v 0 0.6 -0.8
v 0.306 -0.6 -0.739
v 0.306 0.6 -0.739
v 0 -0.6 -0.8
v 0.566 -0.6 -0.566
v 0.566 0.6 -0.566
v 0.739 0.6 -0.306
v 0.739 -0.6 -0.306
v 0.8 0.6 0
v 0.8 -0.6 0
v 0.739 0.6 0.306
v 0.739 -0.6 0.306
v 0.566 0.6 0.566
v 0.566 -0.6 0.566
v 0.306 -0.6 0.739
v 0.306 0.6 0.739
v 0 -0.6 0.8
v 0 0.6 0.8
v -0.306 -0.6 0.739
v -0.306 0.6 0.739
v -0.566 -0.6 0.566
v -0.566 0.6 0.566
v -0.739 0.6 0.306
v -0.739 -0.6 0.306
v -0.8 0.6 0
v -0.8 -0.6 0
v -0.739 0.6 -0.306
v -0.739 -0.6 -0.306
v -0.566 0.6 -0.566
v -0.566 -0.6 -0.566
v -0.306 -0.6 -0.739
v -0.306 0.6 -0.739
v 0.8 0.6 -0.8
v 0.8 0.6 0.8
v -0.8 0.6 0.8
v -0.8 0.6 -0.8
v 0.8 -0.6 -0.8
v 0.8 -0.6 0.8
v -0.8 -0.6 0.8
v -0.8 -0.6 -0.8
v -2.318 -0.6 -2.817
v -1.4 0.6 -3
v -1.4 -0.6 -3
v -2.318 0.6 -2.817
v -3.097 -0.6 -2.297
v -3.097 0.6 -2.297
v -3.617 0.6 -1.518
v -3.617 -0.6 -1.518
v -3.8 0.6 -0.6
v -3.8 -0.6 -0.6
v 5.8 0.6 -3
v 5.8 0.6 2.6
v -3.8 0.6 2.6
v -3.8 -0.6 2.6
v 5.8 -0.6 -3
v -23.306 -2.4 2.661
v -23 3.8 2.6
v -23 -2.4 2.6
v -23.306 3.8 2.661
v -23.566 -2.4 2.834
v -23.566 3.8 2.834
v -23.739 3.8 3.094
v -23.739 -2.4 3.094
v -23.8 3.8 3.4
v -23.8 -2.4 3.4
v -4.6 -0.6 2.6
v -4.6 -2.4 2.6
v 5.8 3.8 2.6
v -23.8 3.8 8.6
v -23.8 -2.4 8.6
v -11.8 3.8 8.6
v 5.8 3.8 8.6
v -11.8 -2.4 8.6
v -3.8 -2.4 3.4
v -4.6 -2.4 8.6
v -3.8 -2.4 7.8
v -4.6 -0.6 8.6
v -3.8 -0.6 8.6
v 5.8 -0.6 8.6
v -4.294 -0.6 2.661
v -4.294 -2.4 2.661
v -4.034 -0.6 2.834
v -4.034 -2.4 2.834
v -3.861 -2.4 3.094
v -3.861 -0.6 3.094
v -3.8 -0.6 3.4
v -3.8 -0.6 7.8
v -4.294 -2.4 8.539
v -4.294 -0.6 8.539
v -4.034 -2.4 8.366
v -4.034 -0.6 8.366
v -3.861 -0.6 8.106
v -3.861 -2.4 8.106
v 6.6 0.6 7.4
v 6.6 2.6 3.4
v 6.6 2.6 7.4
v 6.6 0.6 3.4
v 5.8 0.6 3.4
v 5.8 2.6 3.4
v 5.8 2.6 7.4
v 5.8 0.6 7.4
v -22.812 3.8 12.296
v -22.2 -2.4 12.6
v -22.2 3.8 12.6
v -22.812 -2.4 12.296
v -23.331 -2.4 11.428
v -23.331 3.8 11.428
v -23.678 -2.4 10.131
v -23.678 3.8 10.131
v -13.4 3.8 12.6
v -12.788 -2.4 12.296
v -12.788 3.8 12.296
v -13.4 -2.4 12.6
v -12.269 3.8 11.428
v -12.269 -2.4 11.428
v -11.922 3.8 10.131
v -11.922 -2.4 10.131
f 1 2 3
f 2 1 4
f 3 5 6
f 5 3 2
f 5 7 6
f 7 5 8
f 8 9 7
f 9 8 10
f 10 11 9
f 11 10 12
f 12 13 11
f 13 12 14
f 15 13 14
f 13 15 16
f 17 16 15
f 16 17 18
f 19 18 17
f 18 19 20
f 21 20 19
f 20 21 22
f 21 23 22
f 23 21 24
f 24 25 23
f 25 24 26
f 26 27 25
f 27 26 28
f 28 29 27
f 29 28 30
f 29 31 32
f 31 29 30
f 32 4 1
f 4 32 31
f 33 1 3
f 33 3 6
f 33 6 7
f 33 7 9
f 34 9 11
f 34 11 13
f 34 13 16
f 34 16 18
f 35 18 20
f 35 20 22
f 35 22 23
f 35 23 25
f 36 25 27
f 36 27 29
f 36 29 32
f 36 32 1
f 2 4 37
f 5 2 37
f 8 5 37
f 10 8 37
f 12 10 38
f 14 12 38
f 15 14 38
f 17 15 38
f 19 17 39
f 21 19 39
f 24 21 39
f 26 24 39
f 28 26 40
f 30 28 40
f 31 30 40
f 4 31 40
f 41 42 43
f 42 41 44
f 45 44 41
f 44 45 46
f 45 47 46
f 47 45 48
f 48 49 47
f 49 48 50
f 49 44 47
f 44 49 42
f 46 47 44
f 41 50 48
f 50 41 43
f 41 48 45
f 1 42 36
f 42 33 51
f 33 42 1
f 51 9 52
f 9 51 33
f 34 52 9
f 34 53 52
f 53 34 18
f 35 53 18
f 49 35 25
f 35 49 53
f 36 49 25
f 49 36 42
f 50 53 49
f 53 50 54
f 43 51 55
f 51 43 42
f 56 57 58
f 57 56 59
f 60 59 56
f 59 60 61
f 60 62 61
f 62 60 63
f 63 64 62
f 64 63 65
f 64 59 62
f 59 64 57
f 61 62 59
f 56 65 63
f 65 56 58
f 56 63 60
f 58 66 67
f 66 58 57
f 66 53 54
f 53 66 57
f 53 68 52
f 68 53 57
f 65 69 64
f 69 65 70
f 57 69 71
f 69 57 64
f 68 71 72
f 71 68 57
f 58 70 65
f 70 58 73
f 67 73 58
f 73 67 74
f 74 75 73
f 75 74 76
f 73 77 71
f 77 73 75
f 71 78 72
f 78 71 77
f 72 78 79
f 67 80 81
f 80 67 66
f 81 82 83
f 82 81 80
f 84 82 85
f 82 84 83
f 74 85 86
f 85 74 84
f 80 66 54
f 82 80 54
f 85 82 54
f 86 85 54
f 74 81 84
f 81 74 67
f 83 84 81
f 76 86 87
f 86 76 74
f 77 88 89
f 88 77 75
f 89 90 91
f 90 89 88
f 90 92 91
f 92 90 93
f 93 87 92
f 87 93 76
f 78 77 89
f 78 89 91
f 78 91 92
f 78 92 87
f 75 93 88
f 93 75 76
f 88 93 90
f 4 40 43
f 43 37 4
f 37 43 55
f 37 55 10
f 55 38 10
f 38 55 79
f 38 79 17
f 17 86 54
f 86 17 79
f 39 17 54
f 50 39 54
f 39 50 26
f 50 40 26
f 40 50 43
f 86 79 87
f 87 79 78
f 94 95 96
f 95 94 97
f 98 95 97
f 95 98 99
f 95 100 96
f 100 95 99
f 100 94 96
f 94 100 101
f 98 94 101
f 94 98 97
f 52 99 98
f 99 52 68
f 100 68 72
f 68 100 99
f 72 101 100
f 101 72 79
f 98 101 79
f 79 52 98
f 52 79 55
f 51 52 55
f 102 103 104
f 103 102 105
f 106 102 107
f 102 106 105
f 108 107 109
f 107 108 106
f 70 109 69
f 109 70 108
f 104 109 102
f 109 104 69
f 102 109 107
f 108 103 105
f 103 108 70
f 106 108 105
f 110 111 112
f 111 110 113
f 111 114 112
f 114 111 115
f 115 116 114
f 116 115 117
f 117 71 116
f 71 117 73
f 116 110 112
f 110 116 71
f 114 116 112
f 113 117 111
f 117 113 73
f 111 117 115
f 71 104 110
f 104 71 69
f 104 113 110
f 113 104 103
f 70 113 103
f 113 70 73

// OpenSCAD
// file: ../p/4-4edge.scad
use <../lib.scad>
function ldraw_lib__4_4edge() = [
// 0 Circle 1.0
// 0 Name: 4-4edge.dat
// 0 Author: James Jessiman
// 0 !LDRAW_ORG Primitive UPDATE 2017-01
// 0 !LICENSE Licensed under CC BY 4.0 : see CAreadme.txt
// 
// 0 BFC CERTIFY CCW
  [0,"BFC","CERTIFY"],
  [0,"BFC","CCW"],
// 
// 0 !HISTORY 1998-12-15 [PTadmin] Official Update 1998-10
// 0 !HISTORY 2005-12-28 [PTadmin] Official Update 2005-01
// 0 !HISTORY 2007-06-24 [PTadmin] Header formatted for Contributor Agreement
// 0 !HISTORY 2008-07-01 [PTadmin] Official Update 2008-01
// 0 !HISTORY 2017-01-15 [Steffen] BFCed
// 0 !HISTORY 2017-12-30 [PTadmin] Official Update 2017-01
// 
// 
// 2 24 1 0 0 0.9239 0 0.3827
  [2,24,1,0,0,0.9239,0,0.3827],
// 2 24 0.9239 0 0.3827 0.7071 0 0.7071
  [2,24,0.9239,0,0.3827,0.7071,0,0.7071],
// 2 24 0.7071 0 0.7071 0.3827 0 0.9239
  [2,24,0.7071,0,0.7071,0.3827,0,0.9239],
// 2 24 0.3827 0 0.9239 0 0 1
  [2,24,0.3827,0,0.9239,0,0,1],
// 2 24 0 0 1 -0.3827 0 0.9239
  [2,24,0,0,1,-0.3827,0,0.9239],
// 2 24 -0.3827 0 0.9239 -0.7071 0 0.7071
  [2,24,-0.3827,0,0.9239,-0.7071,0,0.7071],
// 2 24 -0.7071 0 0.7071 -0.9239 0 0.3827
  [2,24,-0.7071,0,0.7071,-0.9239,0,0.3827],
// 2 24 -0.9239 0 0.3827 -1 0 -0
  [2,24,-0.9239,0,0.3827,-1,0,-0],
// 2 24 -1 0 -0 -0.9239 0 -0.3827
  [2,24,-1,0,-0,-0.9239,0,-0.3827],
// 2 24 -0.9239 0 -0.3827 -0.7071 0 -0.7071
  [2,24,-0.9239,0,-0.3827,-0.7071,0,-0.7071],
// 2 24 -0.7071 0 -0.7071 -0.3827 0 -0.9239
  [2,24,-0.7071,0,-0.7071,-0.3827,0,-0.9239],
// 2 24 -0.3827 0 -0.9239 0 0 -1
  [2,24,-0.3827,0,-0.9239,0,0,-1],
// 2 24 0 0 -1 0.3827 0 -0.9239
  [2,24,0,0,-1,0.3827,0,-0.9239],
// 2 24 0.3827 0 -0.9239 0.7071 0 -0.7071
  [2,24,0.3827,0,-0.9239,0.7071,0,-0.7071],
// 2 24 0.7071 0 -0.7071 0.9239 0 -0.3827
  [2,24,0.7071,0,-0.7071,0.9239,0,-0.3827],
// 2 24 0.9239 0 -0.3827 1 0 0
  [2,24,0.9239,0,-0.3827,1,0,0],
];
module ldraw_lib__4_4edge(step=0, col=false, unit=2/5, alt=false, line=0.2, solid=!$preview)
    makepoly(ldraw_lib__4_4edge(), step=step, col=col, unit=unit, alt=alt, line=line, solid=solid);
ldraw_lib__4_4edge(line=0.2);
// file: ../p/4-4cyli.scad
use <../lib.scad>
function ldraw_lib__4_4cyli() = [
// 0 Cylinder 1.0
// 0 Name: 4-4cyli.dat
// 0 Author: James Jessiman
// 0 !LDRAW_ORG Primitive UPDATE 2005-01
// 0 !LICENSE Licensed under CC BY 4.0 : see CAreadme.txt
// 
// 0 BFC CERTIFY CCW
  [0,"BFC","CERTIFY"],
  [0,"BFC","CCW"],
// 
// 0 !HISTORY 1998-12-15 [PTadmin] Official Update 1998-10
// 0 !HISTORY 2002-03-23 [sbliss] Added BFC statement; merged headers from files in distributions LDraw 0.27 and Complete.
// 0 !HISTORY 2002-04-25 [PTadmin] Official Update 2002-02
// 0 !HISTORY 2004-12-14 [guyvivan] BFC CCW
// 0 !HISTORY 2005-12-28 [PTadmin] Official Update 2005-01
// 0 !HISTORY 2007-06-24 [PTadmin] Header formatted for Contributor Agreement
// 0 !HISTORY 2008-07-01 [PTadmin] Official Update 2008-01
// 
// 
// 4 16 1 1 0 0.9239 1 0.3827 0.9239 0 0.3827 1 0 0
  [4,16,1,1,0,0.9239,1,0.3827,0.9239,0,0.3827,1,0,0],
// 5 24 1 0 0 1 1 0 0.9239 0 0.3827 0.9239 0 -0.3827
  [5,24,1,0,0,1,1,0,0.9239,0,0.3827,0.9239,0,-0.3827],
// 4 16 0.9239 1 0.3827 0.7071 1 0.7071 0.7071 0 0.7071 0.9239 0 0.3827
  [4,16,0.9239,1,0.3827,0.7071,1,0.7071,0.7071,0,0.7071,0.9239,0,0.3827],
// 5 24 0.9239 0 0.3827 0.9239 1 0.3827 0.7071 0 0.7071 1 0 0
  [5,24,0.9239,0,0.3827,0.9239,1,0.3827,0.7071,0,0.7071,1,0,0],
// 4 16 0.7071 1 0.7071 0.3827 1 0.9239 0.3827 0 0.9239 0.7071 0 0.7071
  [4,16,0.7071,1,0.7071,0.3827,1,0.9239,0.3827,0,0.9239,0.7071,0,0.7071],
// 5 24 0.7071 0 0.7071 0.7071 1 0.7071 0.3827 0 0.9239 0.9239 0 0.3827
  [5,24,0.7071,0,0.7071,0.7071,1,0.7071,0.3827,0,0.9239,0.9239,0,0.3827],
// 4 16 0.3827 1 0.9239 0 1 1 0 0 1 0.3827 0 0.9239
  [4,16,0.3827,1,0.9239,0,1,1,0,0,1,0.3827,0,0.9239],
// 5 24 0.3827 0 0.9239 0.3827 1 0.9239 0 0 1 0.7071 0 0.7071
  [5,24,0.3827,0,0.9239,0.3827,1,0.9239,0,0,1,0.7071,0,0.7071],
// 4 16 0 1 1 -0.3827 1 0.9239 -0.3827 0 0.9239 0 0 1
  [4,16,0,1,1,-0.3827,1,0.9239,-0.3827,0,0.9239,0,0,1],
// 5 24 0 0 1 0 1 1 -0.3827 0 0.9239 0.3827 0 0.9239
  [5,24,0,0,1,0,1,1,-0.3827,0,0.9239,0.3827,0,0.9239],
// 4 16 -0.3827 1 0.9239 -0.7071 1 0.7071 -0.7071 0 0.7071 -0.3827 0 0.9239
  [4,16,-0.3827,1,0.9239,-0.7071,1,0.7071,-0.7071,0,0.7071,-0.3827,0,0.9239],
// 5 24 -0.3827 0 0.9239 -0.3827 1 0.9239 -0.7071 0 0.7071 0 0 1
  [5,24,-0.3827,0,0.9239,-0.3827,1,0.9239,-0.7071,0,0.7071,0,0,1],
// 4 16 -0.7071 1 0.7071 -0.9239 1 0.3827 -0.9239 0 0.3827 -0.7071 0 0.7071
  [4,16,-0.7071,1,0.7071,-0.9239,1,0.3827,-0.9239,0,0.3827,-0.7071,0,0.7071],
// 5 24 -0.7071 0 0.7071 -0.7071 1 0.7071 -0.9239 0 0.3827 -0.3827 0 0.9239
  [5,24,-0.7071,0,0.7071,-0.7071,1,0.7071,-0.9239,0,0.3827,-0.3827,0,0.9239],
// 4 16 -0.9239 1 0.3827 -1 1 0 -1 0 0 -0.9239 0 0.3827
  [4,16,-0.9239,1,0.3827,-1,1,0,-1,0,0,-0.9239,0,0.3827],
// 5 24 -0.9239 0 0.3827 -0.9239 1 0.3827 -1 0 0 -0.7071 0 0.7071
  [5,24,-0.9239,0,0.3827,-0.9239,1,0.3827,-1,0,0,-0.7071,0,0.7071],
// 4 16 -1 1 0 -0.9239 1 -0.3827 -0.9239 0 -0.3827 -1 0 0
  [4,16,-1,1,0,-0.9239,1,-0.3827,-0.9239,0,-0.3827,-1,0,0],
// 5 24 -1 0 0 -1 1 0 -0.9239 0 -0.3827 -0.9239 0 0.3827
  [5,24,-1,0,0,-1,1,0,-0.9239,0,-0.3827,-0.9239,0,0.3827],
// 4 16 -0.9239 1 -0.3827 -0.7071 1 -0.7071 -0.7071 0 -0.7071 -0.9239 0 -0.3827
  [4,16,-0.9239,1,-0.3827,-0.7071,1,-0.7071,-0.7071,0,-0.7071,-0.9239,0,-0.3827],
// 5 24 -0.9239 0 -0.3827 -0.9239 1 -0.3827 -0.7071 0 -0.7071 -1 0 0
  [5,24,-0.9239,0,-0.3827,-0.9239,1,-0.3827,-0.7071,0,-0.7071,-1,0,0],
// 4 16 -0.7071 1 -0.7071 -0.3827 1 -0.9239 -0.3827 0 -0.9239 -0.7071 0 -0.7071
  [4,16,-0.7071,1,-0.7071,-0.3827,1,-0.9239,-0.3827,0,-0.9239,-0.7071,0,-0.7071],
// 5 24 -0.7071 0 -0.7071 -0.7071 1 -0.7071 -0.3827 0 -0.9239 -0.9239 0 -0.3827
  [5,24,-0.7071,0,-0.7071,-0.7071,1,-0.7071,-0.3827,0,-0.9239,-0.9239,0,-0.3827],
// 4 16 -0.3827 1 -0.9239 0 1 -1 0 0 -1 -0.3827 0 -0.9239
  [4,16,-0.3827,1,-0.9239,0,1,-1,0,0,-1,-0.3827,0,-0.9239],
// 5 24 -0.3827 0 -0.9239 -0.3827 1 -0.9239 0 0 -1 -0.7071 0 -0.7071
  [5,24,-0.3827,0,-0.9239,-0.3827,1,-0.9239,0,0,-1,-0.7071,0,-0.7071],
// 4 16 0 1 -1 0.3827 1 -0.9239 0.3827 0 -0.9239 0 0 -1
  [4,16,0,1,-1,0.3827,1,-0.9239,0.3827,0,-0.9239,0,0,-1],
// 5 24 0 0 -1 0 1 -1 0.3827 0 -0.9239 -0.3827 0 -0.9239
  [5,24,0,0,-1,0,1,-1,0.3827,0,-0.9239,-0.3827,0,-0.9239],
// 4 16 0.3827 1 -0.9239 0.7071 1 -0.7071 0.7071 0 -0.7071 0.3827 0 -0.9239
  [4,16,0.3827,1,-0.9239,0.7071,1,-0.7071,0.7071,0,-0.7071,0.3827,0,-0.9239],
// 5 24 0.3827 0 -0.9239 0.3827 1 -0.9239 0.7071 0 -0.7071 0 0 -1
  [5,24,0.3827,0,-0.9239,0.3827,1,-0.9239,0.7071,0,-0.7071,0,0,-1],
// 4 16 0.7071 1 -0.7071 0.9239 1 -0.3827 0.9239 0 -0.3827 0.7071 0 -0.7071
  [4,16,0.7071,1,-0.7071,0.9239,1,-0.3827,0.9239,0,-0.3827,0.7071,0,-0.7071],
// 5 24 0.7071 0 -0.7071 0.7071 1 -0.7071 0.9239 0 -0.3827 0.3827 0 -0.9239
  [5,24,0.7071,0,-0.7071,0.7071,1,-0.7071,0.9239,0,-0.3827,0.3827,0,-0.9239],
// 4 16 0.9239 1 -0.3827 1 1 0 1 0 0 0.9239 0 -0.3827
  [4,16,0.9239,1,-0.3827,1,1,0,1,0,0,0.9239,0,-0.3827],
// 5 24 0.9239 0 -0.3827 0.9239 1 -0.3827 1 0 0 0.7071 0 -0.7071
  [5,24,0.9239,0,-0.3827,0.9239,1,-0.3827,1,0,0,0.7071,0,-0.7071],
// 0
];
module ldraw_lib__4_4cyli(step=0, col=false, unit=2/5, alt=false, line=0.2, solid=!$preview)
    makepoly(ldraw_lib__4_4cyli(), step=step, col=col, unit=unit, alt=alt, line=line, solid=solid);
ldraw_lib__4_4cyli(line=0.2);
// file: ../p/1-4edge.scad
use <../lib.scad>
function ldraw_lib__1_4edge() = [
// 0 Circle 0.25
// 0 Name: 1-4edge.dat
// 0 Author: James Jessiman
// 0 !LDRAW_ORG Primitive UPDATE 2017-01
// 0 !LICENSE Licensed under CC BY 4.0 : see CAreadme.txt
// 
// 0 BFC CERTIFY CCW
  [0,"BFC","CERTIFY"],
  [0,"BFC","CCW"],
// 
// 0 !HISTORY 2007-06-22 [PTadmin] Header formatted for Contributor Agreement
// 0 !HISTORY 2008-07-01 [PTadmin] Official Update 2008-01
// 0 !HISTORY 2017-01-15 [Steffen] BFCed
// 0 !HISTORY 2017-12-30 [PTadmin] Official Update 2017-01
// 
// 
// 2 24 1 0 0 0.9239 0 0.3827
  [2,24,1,0,0,0.9239,0,0.3827],
// 2 24 0.9239 0 0.3827 0.7071 0 0.7071
  [2,24,0.9239,0,0.3827,0.7071,0,0.7071],
// 2 24 0.7071 0 0.7071 0.3827 0 0.9239
  [2,24,0.7071,0,0.7071,0.3827,0,0.9239],
// 2 24 0.3827 0 0.9239 0 0 1
  [2,24,0.3827,0,0.9239,0,0,1],
];
module ldraw_lib__1_4edge(step=0, col=false, unit=2/5, alt=false, line=0.2, solid=!$preview)
    makepoly(ldraw_lib__1_4edge(), step=step, col=col, unit=unit, alt=alt, line=line, solid=solid);
ldraw_lib__1_4edge(line=0.2);
// file: ../p/1-4cyli.scad
use <../lib.scad>
function ldraw_lib__1_4cyli() = [
// 0 Cylinder 0.25
// 0 Name: 1-4cyli.dat
// 0 Author: James Jessiman
// 0 !LDRAW_ORG Primitive UPDATE 2012-01
// 0 !LICENSE Licensed under CC BY 4.0 : see CAreadme.txt
// 
// 0 BFC CERTIFY CCW
  [0,"BFC","CERTIFY"],
  [0,"BFC","CCW"],
// 
// 0 !HISTORY 2002-03-23 [sbliss] Added BFC statement.
// 0 !HISTORY 2002-04-25 [PTadmin] Official Update 2002-02
// 0 !HISTORY 2007-06-22 [PTadmin] Header formatted for Contributor Agreement
// 0 !HISTORY 2008-07-01 [PTadmin] Official Update 2008-01
// 0 !HISTORY 2012-02-16 [Philo] Changed to CCW
// 0 !HISTORY 2012-03-30 [PTadmin] Official Update 2012-01
// 
// 
// 4 16 1 1 0 0.9239 1 0.3827 0.9239 0 0.3827 1 0 0
  [4,16,1,1,0,0.9239,1,0.3827,0.9239,0,0.3827,1,0,0],
// 5 24 1 0 0 1 1 0 0.9239 0 0.3827 1 0 -1
  [5,24,1,0,0,1,1,0,0.9239,0,0.3827,1,0,-1],
// 4 16 0.9239 1 0.3827 0.7071 1 0.7071 0.7071 0 0.7071 0.9239 0 0.3827
  [4,16,0.9239,1,0.3827,0.7071,1,0.7071,0.7071,0,0.7071,0.9239,0,0.3827],
// 5 24 0.9239 0 0.3827 0.9239 1 0.3827 0.7071 0 0.7071 1 0 0
  [5,24,0.9239,0,0.3827,0.9239,1,0.3827,0.7071,0,0.7071,1,0,0],
// 4 16 0.7071 1 0.7071 0.3827 1 0.9239 0.3827 0 0.9239 0.7071 0 0.7071
  [4,16,0.7071,1,0.7071,0.3827,1,0.9239,0.3827,0,0.9239,0.7071,0,0.7071],
// 5 24 0.7071 0 0.7071 0.7071 1 0.7071 0.3827 0 0.9239 0.9239 0 0.3827
  [5,24,0.7071,0,0.7071,0.7071,1,0.7071,0.3827,0,0.9239,0.9239,0,0.3827],
// 4 16 0.3827 1 0.9239 0 1 1 0 0 1 0.3827 0 0.9239
  [4,16,0.3827,1,0.9239,0,1,1,0,0,1,0.3827,0,0.9239],
// 5 24 0.3827 0 0.9239 0.3827 1 0.9239 0 0 1 0.7071 0 0.7071
  [5,24,0.3827,0,0.9239,0.3827,1,0.9239,0,0,1,0.7071,0,0.7071],
// 5 24 0 0 1 0 1 1 0.3827 0 0.9239 -1 0 1
  [5,24,0,0,1,0,1,1,0.3827,0,0.9239,-1,0,1],
];
module ldraw_lib__1_4cyli(step=0, col=false, unit=2/5, alt=false, line=0.2, solid=!$preview)
    makepoly(ldraw_lib__1_4cyli(), step=step, col=col, unit=unit, alt=alt, line=line, solid=solid);
ldraw_lib__1_4cyli(line=0.2);
// file: ../p/rect3.scad
use <../lib.scad>
function ldraw_lib__rect3() = [
// 0 Rectangle with 3 Edges
// 0 Name: rect3.dat
// 0 Author: Mark Kennedy [mkennedy]
// 0 !LDRAW_ORG Primitive UPDATE 2010-01
// 0 !LICENSE Licensed under CC BY 4.0 : see CAreadme.txt
// 
// 0 BFC CERTIFY CCW
  [0,"BFC","CERTIFY"],
  [0,"BFC","CCW"],
// 
// 0 !HISTORY 2003-08-01 [PTadmin] Official Update 2003-02
// 0 !HISTORY 2007-06-24 [PTadmin] Header formatted for Contributor Agreement
// 0 !HISTORY 2008-07-01 [PTadmin] Official Update 2008-01
// 0 !HISTORY 2010-01-17 [mikeheide] Change winding to CCW
// 0 !HISTORY 2010-04-05 [PTadmin] Official Update 2010-01
// 
// 
// 2 24 1 0 1 -1 0 1
  [2,24,1,0,1,-1,0,1],
// 2 24 1 0 1 1 0 -1
  [2,24,1,0,1,1,0,-1],
// 2 24 -1 0 1 -1 0 -1
  [2,24,-1,0,1,-1,0,-1],
// 4 16 -1 0 1 -1 0 -1 1 0 -1 1 0 1
  [4,16,-1,0,1,-1,0,-1,1,0,-1,1,0,1],
// 0 //
];
module ldraw_lib__rect3(step=0, col=false, unit=2/5, alt=false, line=0.2, solid=!$preview)
    makepoly(ldraw_lib__rect3(), step=step, col=col, unit=unit, alt=alt, line=line, solid=solid);
ldraw_lib__rect3(line=0.2);
// file: ../p/rect2p.scad
use <../lib.scad>
function ldraw_lib__rect2p() = [
// 0 Rectangle with 2 Parallel Edges
// 0 Name: rect2p.dat
// 0 Author: Donald Sutter [technog]
// 0 !LDRAW_ORG Primitive UPDATE 2010-01
// 0 !LICENSE Licensed under CC BY 4.0 : see CAreadme.txt
// 
// 0 BFC CERTIFY CCW
  [0,"BFC","CERTIFY"],
  [0,"BFC","CCW"],
// 
// 0 !HISTORY 2003-08-01 [PTadmin] Official Update 2003-02
// 0 !HISTORY 2007-06-24 [PTadmin] Header formatted for Contributor Agreement
// 0 !HISTORY 2008-07-01 [PTadmin] Official Update 2008-01
// 0 !HISTORY 2010-01-17 [mikeheide] changed winding to CCW
// 0 !HISTORY 2010-04-05 [PTadmin] Official Update 2010-01
// 
// 
// 2 24 1 0 1 -1 0 1
  [2,24,1,0,1,-1,0,1],
// 2 24 -1 0 -1 1 0 -1
  [2,24,-1,0,-1,1,0,-1],
// 4 16 -1 0 1 -1 0 -1 1 0 -1 1 0 1
  [4,16,-1,0,1,-1,0,-1,1,0,-1,1,0,1],
// 0
];
module ldraw_lib__rect2p(step=0, col=false, unit=2/5, alt=false, line=0.2, solid=!$preview)
    makepoly(ldraw_lib__rect2p(), step=step, col=col, unit=unit, alt=alt, line=line, solid=solid);
ldraw_lib__rect2p(line=0.2);
// file: ../p/box5.scad
use <../lib.scad>
function ldraw_lib__box5() = [
// 0 Box with 5 Faces and All Edges
// 0 Name: box5.dat
// 0 Author: James Jessiman
// 0 !LDRAW_ORG Primitive UPDATE 2012-01
// 0 !LICENSE Licensed under CC BY 4.0 : see CAreadme.txt
// 
// 0 BFC CERTIFY CCW
  [0,"BFC","CERTIFY"],
  [0,"BFC","CCW"],
// 
// 0 !HISTORY 2002-04-03 [sbliss] Modified for BFC compliance
// 0 !HISTORY 2002-04-25 [PTadmin] Official Update 2002-02
// 0 !HISTORY 2007-06-24 [PTadmin] Header formatted for Contributor Agreement
// 0 !HISTORY 2008-07-01 [PTadmin] Official Update 2008-01
// 0 !HISTORY 2012-02-16 [Philo] Changed to CCW
// 0 !HISTORY 2012-03-30 [PTadmin] Official Update 2012-01
// 
// 
// 2 24 1 1 1 -1 1 1
  [2,24,1,1,1,-1,1,1],
// 2 24 -1 1 1 -1 1 -1
  [2,24,-1,1,1,-1,1,-1],
// 2 24 -1 1 -1 1 1 -1
  [2,24,-1,1,-1,1,1,-1],
// 2 24 1 1 -1 1 1 1
  [2,24,1,1,-1,1,1,1],
// 2 24 1 0 1 -1 0 1
  [2,24,1,0,1,-1,0,1],
// 2 24 -1 0 1 -1 0 -1
  [2,24,-1,0,1,-1,0,-1],
// 2 24 -1 0 -1 1 0 -1
  [2,24,-1,0,-1,1,0,-1],
// 2 24 1 0 -1 1 0 1
  [2,24,1,0,-1,1,0,1],
// 2 24 1 0 1 1 1 1
  [2,24,1,0,1,1,1,1],
// 2 24 -1 0 1 -1 1 1
  [2,24,-1,0,1,-1,1,1],
// 2 24 1 0 -1 1 1 -1
  [2,24,1,0,-1,1,1,-1],
// 2 24 -1 0 -1 -1 1 -1
  [2,24,-1,0,-1,-1,1,-1],
// 4 16 -1 1 1 1 1 1 1 1 -1 -1 1 -1
  [4,16,-1,1,1,1,1,1,1,1,-1,-1,1,-1],
// 4 16 -1 1 1 -1 0 1 1 0 1 1 1 1
  [4,16,-1,1,1,-1,0,1,1,0,1,1,1,1],
// 4 16 -1 1 -1 -1 0 -1 -1 0 1 -1 1 1
  [4,16,-1,1,-1,-1,0,-1,-1,0,1,-1,1,1],
// 4 16 1 1 -1 1 0 -1 -1 0 -1 -1 1 -1
  [4,16,1,1,-1,1,0,-1,-1,0,-1,-1,1,-1],
// 4 16 1 1 1 1 0 1 1 0 -1 1 1 -1
  [4,16,1,1,1,1,0,1,1,0,-1,1,1,-1],
];
module ldraw_lib__box5(step=0, col=false, unit=2/5, alt=false, line=0.2, solid=!$preview)
    makepoly(ldraw_lib__box5(), step=step, col=col, unit=unit, alt=alt, line=line, solid=solid);
ldraw_lib__box5(line=0.2);
// file: ../p/4-4ndis.scad
use <../lib.scad>
function ldraw_lib__4_4ndis() = [
// 0 Disc Negative 1.0
// 0 Name: 4-4ndis.dat
// 0 Author: James Jessiman
// 0 !LDRAW_ORG Primitive UPDATE 2012-01
// 0 !LICENSE Licensed under CC BY 4.0 : see CAreadme.txt
// 
// 0 BFC CERTIFY CCW
  [0,"BFC","CERTIFY"],
  [0,"BFC","CCW"],
// 
// 0 !HISTORY 2002-03-23 [sbliss] Added BFC statement; compacted code
// 0 !HISTORY 2002-04-25 [PTadmin] Official Update 2002-02
// 0 !HISTORY 2007-06-24 [PTadmin] Header formatted for Contributor Agreement
// 0 !HISTORY 2008-07-01 [PTadmin] Official Update 2008-01
// 0 !HISTORY 2012-02-16 [Philo] Changed to CCW
// 0 !HISTORY 2012-03-30 [PTadmin] Official Update 2012-01
// 
// 
// 3 16 0.9239 0 0.3827 1 0 0 1 0 1
  [3,16,0.9239,0,0.3827,1,0,0,1,0,1],
// 3 16 0.7071 0 0.7071 0.9239 0 0.3827 1 0 1
  [3,16,0.7071,0,0.7071,0.9239,0,0.3827,1,0,1],
// 3 16 0.3827 0 0.9239 0.7071 0 0.7071 1 0 1
  [3,16,0.3827,0,0.9239,0.7071,0,0.7071,1,0,1],
// 3 16 0 0 1 0.3827 0 0.9239 1 0 1
  [3,16,0,0,1,0.3827,0,0.9239,1,0,1],
// 3 16 -0.3827 0 0.9239 0 0 1 -1 0 1
  [3,16,-0.3827,0,0.9239,0,0,1,-1,0,1],
// 3 16 -0.7071 0 0.7071 -0.3827 0 0.9239 -1 0 1
  [3,16,-0.7071,0,0.7071,-0.3827,0,0.9239,-1,0,1],
// 3 16 -0.9239 0 0.3827 -0.7071 0 0.7071 -1 0 1
  [3,16,-0.9239,0,0.3827,-0.7071,0,0.7071,-1,0,1],
// 3 16 -1 0 0 -0.9239 0 0.3827 -1 0 1
  [3,16,-1,0,0,-0.9239,0,0.3827,-1,0,1],
// 3 16 -0.9239 0 -0.3827 -1 0 0 -1 0 -1
  [3,16,-0.9239,0,-0.3827,-1,0,0,-1,0,-1],
// 3 16 -0.7071 0 -0.7071 -0.9239 0 -0.3827 -1 0 -1
  [3,16,-0.7071,0,-0.7071,-0.9239,0,-0.3827,-1,0,-1],
// 3 16 -0.3827 0 -0.9239 -0.7071 0 -0.7071 -1 0 -1
  [3,16,-0.3827,0,-0.9239,-0.7071,0,-0.7071,-1,0,-1],
// 3 16 0 0 -1 -0.3827 0 -0.9239 -1 0 -1
  [3,16,0,0,-1,-0.3827,0,-0.9239,-1,0,-1],
// 3 16 0.3827 0 -0.9239 0 0 -1 1 0 -1
  [3,16,0.3827,0,-0.9239,0,0,-1,1,0,-1],
// 3 16 0.7071 0 -0.7071 0.3827 0 -0.9239 1 0 -1
  [3,16,0.7071,0,-0.7071,0.3827,0,-0.9239,1,0,-1],
// 3 16 0.9239 0 -0.3827 0.7071 0 -0.7071 1 0 -1
  [3,16,0.9239,0,-0.3827,0.7071,0,-0.7071,1,0,-1],
// 3 16 1 0 0 0.9239 0 -0.3827 1 0 -1
  [3,16,1,0,0,0.9239,0,-0.3827,1,0,-1],
];
module ldraw_lib__4_4ndis(step=0, col=false, unit=2/5, alt=false, line=0.2, solid=!$preview)
    makepoly(ldraw_lib__4_4ndis(), step=step, col=col, unit=unit, alt=alt, line=line, solid=solid);
ldraw_lib__4_4ndis(line=0.2);
// file: ../p/4-4cylo.scad
use <../lib.scad>
use <4-4cyli.scad>
use <4-4edge.scad>
function ldraw_lib__4_4cylo() = [
// 0 Cylinder Open 1.0
// 0 Name: 4-4cylo.dat
// 0 Author: Mark Kennedy [mkennedy]
// 0 !LDRAW_ORG Primitive UPDATE 2010-01
// 0 !LICENSE Licensed under CC BY 4.0 : see CAreadme.txt
// 
// 0 BFC CERTIFY CCW
  [0,"BFC","CERTIFY"],
  [0,"BFC","CCW"],
// 
// 0 !HISTORY 2010-04-05 [PTadmin] Official Update 2010-01
// 
// 
// 1 16 0 0 0 1 0 0 0 1 0 0 0 1 4-4edge.dat
  [1,16,0,0,0,1,0,0,0,1,0,0,0,1, ldraw_lib__4_4edge()],
// 1 16 0 1 0 1 0 0 0 1 0 0 0 1 4-4edge.dat
  [1,16,0,1,0,1,0,0,0,1,0,0,0,1, ldraw_lib__4_4edge()],
// 1 16 0 0 0 1 0 0 0 1 0 0 0 1 4-4cyli.dat
  [1,16,0,0,0,1,0,0,0,1,0,0,0,1, ldraw_lib__4_4cyli()],
// 0
];
module ldraw_lib__4_4cylo(step=0, col=false, unit=2/5, alt=false, line=0.2, solid=!$preview)
    makepoly(ldraw_lib__4_4cylo(), step=step, col=col, unit=unit, alt=alt, line=line, solid=solid);
ldraw_lib__4_4cylo(line=0.2);
// file: ../p/1-4ndis.scad
use <../lib.scad>
function ldraw_lib__1_4ndis() = [
// 0 Disc Negative 0.25
// 0 Name: 1-4ndis.dat
// 0 Author: James Jessiman
// 0 !LDRAW_ORG Primitive UPDATE 2012-01
// 0 !LICENSE Licensed under CC BY 4.0 : see CAreadme.txt
// 
// 0 BFC CERTIFY CCW
  [0,"BFC","CERTIFY"],
  [0,"BFC","CCW"],
// 
// 0 !HISTORY 2002-03-23 [sbliss] Added BFC Statement
// 0 !HISTORY 2002-04-25 [PTadmin] Official Update 2002-02
// 0 !HISTORY 2007-06-22 [PTadmin] Header formatted for Contributor Agreement
// 0 !HISTORY 2008-07-01 [PTadmin] Official Update 2008-01
// 0 !HISTORY 2012-02-16 [Philo] Changed to CCW
// 0 !HISTORY 2012-03-30 [PTadmin] Official Update 2012-01
// 
// 
// 3 16 0.9239 0 0.3827 1 0 0 1 0 1
  [3,16,0.9239,0,0.3827,1,0,0,1,0,1],
// 3 16 0.7071 0 0.7071 0.9239 0 0.3827 1 0 1
  [3,16,0.7071,0,0.7071,0.9239,0,0.3827,1,0,1],
// 3 16 0.3827 0 0.9239 0.7071 0 0.7071 1 0 1
  [3,16,0.3827,0,0.9239,0.7071,0,0.7071,1,0,1],
// 3 16 0 0 1 0.3827 0 0.9239 1 0 1
  [3,16,0,0,1,0.3827,0,0.9239,1,0,1],
];
module ldraw_lib__1_4ndis(step=0, col=false, unit=2/5, alt=false, line=0.2, solid=!$preview)
    makepoly(ldraw_lib__1_4ndis(), step=step, col=col, unit=unit, alt=alt, line=line, solid=solid);
ldraw_lib__1_4ndis(line=0.2);
// file: ../p/1-4cylo.scad
use <../lib.scad>
use <1-4cyli.scad>
use <1-4edge.scad>
function ldraw_lib__1_4cylo() = [
// 0 Cylinder Open 0.25
// 0 Name: 1-4cylo.dat
// 0 Author: Max Martin Richter [MMR1988]
// 0 !LDRAW_ORG Primitive UPDATE 2010-03
// 0 !LICENSE Licensed under CC BY 4.0 : see CAreadme.txt
// 
// 0 BFC CERTIFY CCW
  [0,"BFC","CERTIFY"],
  [0,"BFC","CCW"],
// 
// 0 !HISTORY 2010-12-31 [PTadmin] Official Update 2010-03
// 
// 
// 1 16 0 0 0 1 0 0 0 1 0 0 0 1 1-4edge.dat
  [1,16,0,0,0,1,0,0,0,1,0,0,0,1, ldraw_lib__1_4edge()],
// 1 16 0 1 0 1 0 0 0 1 0 0 0 1 1-4edge.dat
  [1,16,0,1,0,1,0,0,0,1,0,0,0,1, ldraw_lib__1_4edge()],
// 1 16 0 0 0 1 0 0 0 1 0 0 0 1 1-4cyli.dat
  [1,16,0,0,0,1,0,0,0,1,0,0,0,1, ldraw_lib__1_4cyli()],
];
module ldraw_lib__1_4cylo(step=0, col=false, unit=2/5, alt=false, line=0.2, solid=!$preview)
    makepoly(ldraw_lib__1_4cylo(), step=step, col=col, unit=unit, alt=alt, line=line, solid=solid);
ldraw_lib__1_4cylo(line=0.2);
// file: ../p/1-4chrd.scad
use <../lib.scad>
function ldraw_lib__1_4chrd() = [
// 0 Chord 0.25
// 0 Name: 1-4chrd.dat
// 0 Author: Max Martin Richter [MMR1988]
// 0 !LDRAW_ORG Primitive UPDATE 2023-05
// 0 !LICENSE Licensed under CC BY 4.0 : see CAreadme.txt
// 
// 0 BFC CERTIFY CCW
  [0,"BFC","CERTIFY"],
  [0,"BFC","CCW"],
// 
// 0 !HISTORY 2004-04-22 [PTadmin] Official Update 2004-02
// 0 !HISTORY 2007-10-09 [PTadmin] Header formatted for Contributor Agreement
// 0 !HISTORY 2008-07-01 [PTadmin] Official Update 2008-01
// 0 !HISTORY 2012-08-02 [MMR1988] Re-creation with PrimGen2 and Rectifier
// 0 !HISTORY 2012-08-09 [PTadmin] Official Update 2012-02
// 0 !HISTORY 2023-10-27 [OrionP] Change author to MMR1988 from hafhead
// 0 !HISTORY 2023-10-31 [OrionP] Official Update 2023-05
// 
// 4 16 0.9239 0 0.3827 0.3827 0 0.9239 0 0 1 1 0 0
  [4,16,0.9239,0,0.3827,0.3827,0,0.9239,0,0,1,1,0,0],
// 3 16 0.7071 0 0.7071 0.3827 0 0.9239 0.9239 0 0.3827
  [3,16,0.7071,0,0.7071,0.3827,0,0.9239,0.9239,0,0.3827],
];
module ldraw_lib__1_4chrd(step=0, col=false, unit=2/5, alt=false, line=0.2, solid=!$preview)
    makepoly(ldraw_lib__1_4chrd(), step=step, col=col, unit=unit, alt=alt, line=line, solid=solid);
ldraw_lib__1_4chrd(line=0.2);
// main file
use <../lib.scad>
use <u9187f.scad>
function ldraw_lib__u9187g() = [
// 0 ~Garage Door Counterweight with Pin Hole Left
// 0 Name: u9187g.dat
// 0 Author: N. W. Perry [Plastikean]
// 0 !LDRAW_ORG Part UPDATE 2023-07
// 0 !LICENSE Licensed under CC BY 4.0 : see CAreadme.txt
// 
// 0 BFC CERTIFY CCW
  [0,"BFC","CERTIFY"],
  [0,"BFC","CCW"],
// 
// 0 !KEYWORDS Lego Mursten
// 
// 0 !HISTORY 2023-12-31 [OrionP] Official Update 2023-07
// 
// 1 16 0 0 0 1 0 0 0 1 0 0 0 -1 u9187f.dat
  [1,16,0,0,0,1,0,0,0,1,0,0,0,-1, ldraw_lib__u9187f()],
];
module ldraw_lib__u9187g(step=0, col=false, unit=2/5, alt=false, line=0.2, solid=!$preview)
    makepoly(ldraw_lib__u9187g(), step=step, col=col, unit=unit, alt=alt, line=line, solid=solid);
ldraw_lib__u9187g(line=0.2);
